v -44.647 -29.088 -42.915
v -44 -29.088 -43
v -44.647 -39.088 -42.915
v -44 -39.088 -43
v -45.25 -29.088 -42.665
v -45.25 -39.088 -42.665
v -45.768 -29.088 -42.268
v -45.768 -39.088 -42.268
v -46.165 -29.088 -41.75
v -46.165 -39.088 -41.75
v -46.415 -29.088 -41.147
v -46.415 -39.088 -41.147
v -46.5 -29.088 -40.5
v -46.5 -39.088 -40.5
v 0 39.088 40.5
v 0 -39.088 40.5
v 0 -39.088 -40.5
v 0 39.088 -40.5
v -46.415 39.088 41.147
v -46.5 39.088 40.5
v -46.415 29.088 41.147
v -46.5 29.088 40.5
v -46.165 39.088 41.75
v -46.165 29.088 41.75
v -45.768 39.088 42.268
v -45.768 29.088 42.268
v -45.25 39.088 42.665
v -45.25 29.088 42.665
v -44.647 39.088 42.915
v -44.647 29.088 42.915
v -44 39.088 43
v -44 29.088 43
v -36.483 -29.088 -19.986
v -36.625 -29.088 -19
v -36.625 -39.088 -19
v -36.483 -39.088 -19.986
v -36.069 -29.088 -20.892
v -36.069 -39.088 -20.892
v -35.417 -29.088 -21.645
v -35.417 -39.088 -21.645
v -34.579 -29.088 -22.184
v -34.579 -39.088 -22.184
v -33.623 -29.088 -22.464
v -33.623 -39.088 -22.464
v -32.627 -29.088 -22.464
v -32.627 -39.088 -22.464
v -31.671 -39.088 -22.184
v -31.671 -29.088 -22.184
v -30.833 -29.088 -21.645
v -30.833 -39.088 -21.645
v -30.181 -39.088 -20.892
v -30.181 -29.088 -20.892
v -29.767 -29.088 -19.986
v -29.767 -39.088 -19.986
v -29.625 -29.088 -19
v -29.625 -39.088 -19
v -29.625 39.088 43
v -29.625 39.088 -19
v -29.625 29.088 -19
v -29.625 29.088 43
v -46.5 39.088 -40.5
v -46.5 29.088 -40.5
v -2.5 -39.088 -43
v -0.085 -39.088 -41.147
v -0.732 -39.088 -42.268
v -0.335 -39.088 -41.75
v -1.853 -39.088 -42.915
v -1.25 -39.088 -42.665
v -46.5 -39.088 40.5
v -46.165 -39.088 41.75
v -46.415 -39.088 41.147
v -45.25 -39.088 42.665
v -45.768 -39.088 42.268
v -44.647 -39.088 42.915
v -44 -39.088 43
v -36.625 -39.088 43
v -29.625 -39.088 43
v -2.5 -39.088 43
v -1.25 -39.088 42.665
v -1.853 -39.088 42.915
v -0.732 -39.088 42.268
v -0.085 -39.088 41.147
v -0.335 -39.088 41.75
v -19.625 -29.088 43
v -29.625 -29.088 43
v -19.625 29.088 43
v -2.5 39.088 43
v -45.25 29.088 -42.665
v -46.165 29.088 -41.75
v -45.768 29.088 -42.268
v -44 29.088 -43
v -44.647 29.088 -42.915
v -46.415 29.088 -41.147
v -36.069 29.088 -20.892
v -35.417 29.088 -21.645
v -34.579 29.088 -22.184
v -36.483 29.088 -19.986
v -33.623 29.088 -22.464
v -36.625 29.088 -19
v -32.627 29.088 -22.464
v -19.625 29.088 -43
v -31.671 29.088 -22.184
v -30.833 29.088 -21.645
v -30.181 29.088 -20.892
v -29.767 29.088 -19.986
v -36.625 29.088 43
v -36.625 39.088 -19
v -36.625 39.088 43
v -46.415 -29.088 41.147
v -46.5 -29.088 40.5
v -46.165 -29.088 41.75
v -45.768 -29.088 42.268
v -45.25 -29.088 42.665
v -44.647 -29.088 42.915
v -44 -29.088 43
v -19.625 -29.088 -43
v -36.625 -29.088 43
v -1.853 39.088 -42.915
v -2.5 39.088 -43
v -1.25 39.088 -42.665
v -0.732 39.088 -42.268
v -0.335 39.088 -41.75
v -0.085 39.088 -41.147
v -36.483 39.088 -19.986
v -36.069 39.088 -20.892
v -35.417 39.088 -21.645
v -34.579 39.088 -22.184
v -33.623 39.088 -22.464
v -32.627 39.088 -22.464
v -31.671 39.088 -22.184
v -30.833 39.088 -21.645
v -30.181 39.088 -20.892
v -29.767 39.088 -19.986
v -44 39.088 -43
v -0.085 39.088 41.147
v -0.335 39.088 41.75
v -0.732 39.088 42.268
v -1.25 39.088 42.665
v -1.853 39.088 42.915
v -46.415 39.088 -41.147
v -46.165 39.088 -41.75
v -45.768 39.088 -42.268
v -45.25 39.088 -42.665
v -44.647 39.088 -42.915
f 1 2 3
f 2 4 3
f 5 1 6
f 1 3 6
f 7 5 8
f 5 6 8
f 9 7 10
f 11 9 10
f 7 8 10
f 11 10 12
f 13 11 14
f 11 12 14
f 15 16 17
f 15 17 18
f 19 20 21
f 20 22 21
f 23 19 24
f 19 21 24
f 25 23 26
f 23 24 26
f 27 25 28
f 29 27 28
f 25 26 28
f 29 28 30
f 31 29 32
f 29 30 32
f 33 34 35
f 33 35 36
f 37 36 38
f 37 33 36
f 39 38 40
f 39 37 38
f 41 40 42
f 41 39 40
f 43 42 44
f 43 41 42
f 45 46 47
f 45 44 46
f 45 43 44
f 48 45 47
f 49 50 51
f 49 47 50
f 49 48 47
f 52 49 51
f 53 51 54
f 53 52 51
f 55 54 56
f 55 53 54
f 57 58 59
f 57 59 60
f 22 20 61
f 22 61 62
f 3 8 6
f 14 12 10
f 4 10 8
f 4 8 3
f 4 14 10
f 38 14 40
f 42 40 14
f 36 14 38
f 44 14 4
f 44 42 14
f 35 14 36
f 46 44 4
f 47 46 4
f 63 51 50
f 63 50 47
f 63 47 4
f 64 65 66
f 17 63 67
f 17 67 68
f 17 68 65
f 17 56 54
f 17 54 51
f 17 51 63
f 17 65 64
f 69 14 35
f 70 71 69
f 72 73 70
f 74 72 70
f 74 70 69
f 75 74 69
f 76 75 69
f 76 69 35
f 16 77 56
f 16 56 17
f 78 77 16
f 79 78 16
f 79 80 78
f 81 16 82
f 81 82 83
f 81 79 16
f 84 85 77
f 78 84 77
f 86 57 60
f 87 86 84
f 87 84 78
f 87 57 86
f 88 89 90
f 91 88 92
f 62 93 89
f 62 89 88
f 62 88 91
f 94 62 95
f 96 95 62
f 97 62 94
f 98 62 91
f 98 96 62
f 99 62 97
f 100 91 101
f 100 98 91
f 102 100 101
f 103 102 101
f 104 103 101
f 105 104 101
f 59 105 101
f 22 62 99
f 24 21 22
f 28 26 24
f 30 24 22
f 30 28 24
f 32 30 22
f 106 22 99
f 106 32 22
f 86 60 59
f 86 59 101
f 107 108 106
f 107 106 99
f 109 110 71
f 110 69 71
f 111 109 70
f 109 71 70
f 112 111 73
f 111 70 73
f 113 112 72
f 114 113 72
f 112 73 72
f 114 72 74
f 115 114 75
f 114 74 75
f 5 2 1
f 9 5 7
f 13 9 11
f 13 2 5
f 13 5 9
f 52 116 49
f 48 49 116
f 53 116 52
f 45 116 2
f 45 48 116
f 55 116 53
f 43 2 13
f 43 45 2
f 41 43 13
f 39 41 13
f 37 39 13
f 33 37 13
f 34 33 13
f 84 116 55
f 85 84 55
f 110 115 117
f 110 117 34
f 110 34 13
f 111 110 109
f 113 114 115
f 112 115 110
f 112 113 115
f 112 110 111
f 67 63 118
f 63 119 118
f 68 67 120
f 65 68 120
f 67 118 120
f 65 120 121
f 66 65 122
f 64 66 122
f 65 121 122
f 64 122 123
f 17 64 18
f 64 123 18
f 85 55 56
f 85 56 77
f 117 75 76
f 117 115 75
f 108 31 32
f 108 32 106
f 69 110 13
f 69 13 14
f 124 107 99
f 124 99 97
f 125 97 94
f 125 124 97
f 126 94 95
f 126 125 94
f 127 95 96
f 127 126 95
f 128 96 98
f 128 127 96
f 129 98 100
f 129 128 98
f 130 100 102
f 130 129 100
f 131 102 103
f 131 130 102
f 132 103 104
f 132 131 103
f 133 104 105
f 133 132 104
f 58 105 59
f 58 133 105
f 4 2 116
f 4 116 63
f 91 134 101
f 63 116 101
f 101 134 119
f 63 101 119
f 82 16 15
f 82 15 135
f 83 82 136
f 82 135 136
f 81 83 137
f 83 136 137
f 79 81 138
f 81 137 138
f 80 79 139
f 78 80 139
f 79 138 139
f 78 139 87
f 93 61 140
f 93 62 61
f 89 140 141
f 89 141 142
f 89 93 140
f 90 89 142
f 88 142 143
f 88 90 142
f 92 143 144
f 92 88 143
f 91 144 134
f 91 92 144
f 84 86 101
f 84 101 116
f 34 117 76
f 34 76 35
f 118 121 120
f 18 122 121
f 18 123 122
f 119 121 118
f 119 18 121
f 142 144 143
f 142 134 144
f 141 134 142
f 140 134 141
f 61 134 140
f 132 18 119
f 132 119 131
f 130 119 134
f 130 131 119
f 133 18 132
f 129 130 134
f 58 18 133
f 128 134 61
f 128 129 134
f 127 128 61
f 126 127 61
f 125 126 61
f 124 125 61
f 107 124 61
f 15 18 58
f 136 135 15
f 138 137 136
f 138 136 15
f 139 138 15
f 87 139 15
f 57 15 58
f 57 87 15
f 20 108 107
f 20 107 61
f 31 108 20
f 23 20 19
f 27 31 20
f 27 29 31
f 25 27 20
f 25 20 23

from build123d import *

# Parameters (mm, degrees)
BOSS_EXTRUDE1_DEPTH = 43
CUT_EXTRUDE2_DEPTH  = 101.611036298
FILLET1_R           = 2.5


with BuildPart() as part:
    # Sketch1 → Boss-Extrude1 (new, symmetric)
    with BuildSketch(Plane.XY):
        Polygon((-46.5, 39.0875), (-46.5, 29.0875), (-19.625, 29.0875), (-19.625, -29.0875), (-46.5, -29.0875), (-46.5, -39.0875), (0, -39.0875), (0, 39.0875), align=None)
    extrude(amount=BOSS_EXTRUDE1_DEPTH, both=True)

    # Sketch2 → Cut-Extrude2 (cut, through all)
    with BuildSketch(Plane(origin=(0, 39.0875, 0), x_dir=(1, 0, 0), z_dir=(0, 1, 0))):
        with BuildLine():
            Line((-36.625, -43), (-36.625, 19))
            ThreePointArc((-36.625, 19), (-33.125, 22.5), (-29.625, 19))
            Line((-29.625, 19), (-29.625, -43))
            Line((-29.625, -43), (-36.625, -43))
        make_face()
    extrude(amount=-CUT_EXTRUDE2_DEPTH, mode=Mode.SUBTRACT)

    # Fillet1
    fillet1_edges = [part.edges().sort_by_distance(p)[0] for p in [
        (-46.5, 34.0875, -43),
        (-46.5, -34.0875, 43),
        (0, 0, 43),
        (0, 0, -43),
        (-46.5, 34.0875, 43),
        (-46.5, -34.0875, -43),
    ]]
    fillet(fillet1_edges, radius=FILLET1_R)


solid = part.part
